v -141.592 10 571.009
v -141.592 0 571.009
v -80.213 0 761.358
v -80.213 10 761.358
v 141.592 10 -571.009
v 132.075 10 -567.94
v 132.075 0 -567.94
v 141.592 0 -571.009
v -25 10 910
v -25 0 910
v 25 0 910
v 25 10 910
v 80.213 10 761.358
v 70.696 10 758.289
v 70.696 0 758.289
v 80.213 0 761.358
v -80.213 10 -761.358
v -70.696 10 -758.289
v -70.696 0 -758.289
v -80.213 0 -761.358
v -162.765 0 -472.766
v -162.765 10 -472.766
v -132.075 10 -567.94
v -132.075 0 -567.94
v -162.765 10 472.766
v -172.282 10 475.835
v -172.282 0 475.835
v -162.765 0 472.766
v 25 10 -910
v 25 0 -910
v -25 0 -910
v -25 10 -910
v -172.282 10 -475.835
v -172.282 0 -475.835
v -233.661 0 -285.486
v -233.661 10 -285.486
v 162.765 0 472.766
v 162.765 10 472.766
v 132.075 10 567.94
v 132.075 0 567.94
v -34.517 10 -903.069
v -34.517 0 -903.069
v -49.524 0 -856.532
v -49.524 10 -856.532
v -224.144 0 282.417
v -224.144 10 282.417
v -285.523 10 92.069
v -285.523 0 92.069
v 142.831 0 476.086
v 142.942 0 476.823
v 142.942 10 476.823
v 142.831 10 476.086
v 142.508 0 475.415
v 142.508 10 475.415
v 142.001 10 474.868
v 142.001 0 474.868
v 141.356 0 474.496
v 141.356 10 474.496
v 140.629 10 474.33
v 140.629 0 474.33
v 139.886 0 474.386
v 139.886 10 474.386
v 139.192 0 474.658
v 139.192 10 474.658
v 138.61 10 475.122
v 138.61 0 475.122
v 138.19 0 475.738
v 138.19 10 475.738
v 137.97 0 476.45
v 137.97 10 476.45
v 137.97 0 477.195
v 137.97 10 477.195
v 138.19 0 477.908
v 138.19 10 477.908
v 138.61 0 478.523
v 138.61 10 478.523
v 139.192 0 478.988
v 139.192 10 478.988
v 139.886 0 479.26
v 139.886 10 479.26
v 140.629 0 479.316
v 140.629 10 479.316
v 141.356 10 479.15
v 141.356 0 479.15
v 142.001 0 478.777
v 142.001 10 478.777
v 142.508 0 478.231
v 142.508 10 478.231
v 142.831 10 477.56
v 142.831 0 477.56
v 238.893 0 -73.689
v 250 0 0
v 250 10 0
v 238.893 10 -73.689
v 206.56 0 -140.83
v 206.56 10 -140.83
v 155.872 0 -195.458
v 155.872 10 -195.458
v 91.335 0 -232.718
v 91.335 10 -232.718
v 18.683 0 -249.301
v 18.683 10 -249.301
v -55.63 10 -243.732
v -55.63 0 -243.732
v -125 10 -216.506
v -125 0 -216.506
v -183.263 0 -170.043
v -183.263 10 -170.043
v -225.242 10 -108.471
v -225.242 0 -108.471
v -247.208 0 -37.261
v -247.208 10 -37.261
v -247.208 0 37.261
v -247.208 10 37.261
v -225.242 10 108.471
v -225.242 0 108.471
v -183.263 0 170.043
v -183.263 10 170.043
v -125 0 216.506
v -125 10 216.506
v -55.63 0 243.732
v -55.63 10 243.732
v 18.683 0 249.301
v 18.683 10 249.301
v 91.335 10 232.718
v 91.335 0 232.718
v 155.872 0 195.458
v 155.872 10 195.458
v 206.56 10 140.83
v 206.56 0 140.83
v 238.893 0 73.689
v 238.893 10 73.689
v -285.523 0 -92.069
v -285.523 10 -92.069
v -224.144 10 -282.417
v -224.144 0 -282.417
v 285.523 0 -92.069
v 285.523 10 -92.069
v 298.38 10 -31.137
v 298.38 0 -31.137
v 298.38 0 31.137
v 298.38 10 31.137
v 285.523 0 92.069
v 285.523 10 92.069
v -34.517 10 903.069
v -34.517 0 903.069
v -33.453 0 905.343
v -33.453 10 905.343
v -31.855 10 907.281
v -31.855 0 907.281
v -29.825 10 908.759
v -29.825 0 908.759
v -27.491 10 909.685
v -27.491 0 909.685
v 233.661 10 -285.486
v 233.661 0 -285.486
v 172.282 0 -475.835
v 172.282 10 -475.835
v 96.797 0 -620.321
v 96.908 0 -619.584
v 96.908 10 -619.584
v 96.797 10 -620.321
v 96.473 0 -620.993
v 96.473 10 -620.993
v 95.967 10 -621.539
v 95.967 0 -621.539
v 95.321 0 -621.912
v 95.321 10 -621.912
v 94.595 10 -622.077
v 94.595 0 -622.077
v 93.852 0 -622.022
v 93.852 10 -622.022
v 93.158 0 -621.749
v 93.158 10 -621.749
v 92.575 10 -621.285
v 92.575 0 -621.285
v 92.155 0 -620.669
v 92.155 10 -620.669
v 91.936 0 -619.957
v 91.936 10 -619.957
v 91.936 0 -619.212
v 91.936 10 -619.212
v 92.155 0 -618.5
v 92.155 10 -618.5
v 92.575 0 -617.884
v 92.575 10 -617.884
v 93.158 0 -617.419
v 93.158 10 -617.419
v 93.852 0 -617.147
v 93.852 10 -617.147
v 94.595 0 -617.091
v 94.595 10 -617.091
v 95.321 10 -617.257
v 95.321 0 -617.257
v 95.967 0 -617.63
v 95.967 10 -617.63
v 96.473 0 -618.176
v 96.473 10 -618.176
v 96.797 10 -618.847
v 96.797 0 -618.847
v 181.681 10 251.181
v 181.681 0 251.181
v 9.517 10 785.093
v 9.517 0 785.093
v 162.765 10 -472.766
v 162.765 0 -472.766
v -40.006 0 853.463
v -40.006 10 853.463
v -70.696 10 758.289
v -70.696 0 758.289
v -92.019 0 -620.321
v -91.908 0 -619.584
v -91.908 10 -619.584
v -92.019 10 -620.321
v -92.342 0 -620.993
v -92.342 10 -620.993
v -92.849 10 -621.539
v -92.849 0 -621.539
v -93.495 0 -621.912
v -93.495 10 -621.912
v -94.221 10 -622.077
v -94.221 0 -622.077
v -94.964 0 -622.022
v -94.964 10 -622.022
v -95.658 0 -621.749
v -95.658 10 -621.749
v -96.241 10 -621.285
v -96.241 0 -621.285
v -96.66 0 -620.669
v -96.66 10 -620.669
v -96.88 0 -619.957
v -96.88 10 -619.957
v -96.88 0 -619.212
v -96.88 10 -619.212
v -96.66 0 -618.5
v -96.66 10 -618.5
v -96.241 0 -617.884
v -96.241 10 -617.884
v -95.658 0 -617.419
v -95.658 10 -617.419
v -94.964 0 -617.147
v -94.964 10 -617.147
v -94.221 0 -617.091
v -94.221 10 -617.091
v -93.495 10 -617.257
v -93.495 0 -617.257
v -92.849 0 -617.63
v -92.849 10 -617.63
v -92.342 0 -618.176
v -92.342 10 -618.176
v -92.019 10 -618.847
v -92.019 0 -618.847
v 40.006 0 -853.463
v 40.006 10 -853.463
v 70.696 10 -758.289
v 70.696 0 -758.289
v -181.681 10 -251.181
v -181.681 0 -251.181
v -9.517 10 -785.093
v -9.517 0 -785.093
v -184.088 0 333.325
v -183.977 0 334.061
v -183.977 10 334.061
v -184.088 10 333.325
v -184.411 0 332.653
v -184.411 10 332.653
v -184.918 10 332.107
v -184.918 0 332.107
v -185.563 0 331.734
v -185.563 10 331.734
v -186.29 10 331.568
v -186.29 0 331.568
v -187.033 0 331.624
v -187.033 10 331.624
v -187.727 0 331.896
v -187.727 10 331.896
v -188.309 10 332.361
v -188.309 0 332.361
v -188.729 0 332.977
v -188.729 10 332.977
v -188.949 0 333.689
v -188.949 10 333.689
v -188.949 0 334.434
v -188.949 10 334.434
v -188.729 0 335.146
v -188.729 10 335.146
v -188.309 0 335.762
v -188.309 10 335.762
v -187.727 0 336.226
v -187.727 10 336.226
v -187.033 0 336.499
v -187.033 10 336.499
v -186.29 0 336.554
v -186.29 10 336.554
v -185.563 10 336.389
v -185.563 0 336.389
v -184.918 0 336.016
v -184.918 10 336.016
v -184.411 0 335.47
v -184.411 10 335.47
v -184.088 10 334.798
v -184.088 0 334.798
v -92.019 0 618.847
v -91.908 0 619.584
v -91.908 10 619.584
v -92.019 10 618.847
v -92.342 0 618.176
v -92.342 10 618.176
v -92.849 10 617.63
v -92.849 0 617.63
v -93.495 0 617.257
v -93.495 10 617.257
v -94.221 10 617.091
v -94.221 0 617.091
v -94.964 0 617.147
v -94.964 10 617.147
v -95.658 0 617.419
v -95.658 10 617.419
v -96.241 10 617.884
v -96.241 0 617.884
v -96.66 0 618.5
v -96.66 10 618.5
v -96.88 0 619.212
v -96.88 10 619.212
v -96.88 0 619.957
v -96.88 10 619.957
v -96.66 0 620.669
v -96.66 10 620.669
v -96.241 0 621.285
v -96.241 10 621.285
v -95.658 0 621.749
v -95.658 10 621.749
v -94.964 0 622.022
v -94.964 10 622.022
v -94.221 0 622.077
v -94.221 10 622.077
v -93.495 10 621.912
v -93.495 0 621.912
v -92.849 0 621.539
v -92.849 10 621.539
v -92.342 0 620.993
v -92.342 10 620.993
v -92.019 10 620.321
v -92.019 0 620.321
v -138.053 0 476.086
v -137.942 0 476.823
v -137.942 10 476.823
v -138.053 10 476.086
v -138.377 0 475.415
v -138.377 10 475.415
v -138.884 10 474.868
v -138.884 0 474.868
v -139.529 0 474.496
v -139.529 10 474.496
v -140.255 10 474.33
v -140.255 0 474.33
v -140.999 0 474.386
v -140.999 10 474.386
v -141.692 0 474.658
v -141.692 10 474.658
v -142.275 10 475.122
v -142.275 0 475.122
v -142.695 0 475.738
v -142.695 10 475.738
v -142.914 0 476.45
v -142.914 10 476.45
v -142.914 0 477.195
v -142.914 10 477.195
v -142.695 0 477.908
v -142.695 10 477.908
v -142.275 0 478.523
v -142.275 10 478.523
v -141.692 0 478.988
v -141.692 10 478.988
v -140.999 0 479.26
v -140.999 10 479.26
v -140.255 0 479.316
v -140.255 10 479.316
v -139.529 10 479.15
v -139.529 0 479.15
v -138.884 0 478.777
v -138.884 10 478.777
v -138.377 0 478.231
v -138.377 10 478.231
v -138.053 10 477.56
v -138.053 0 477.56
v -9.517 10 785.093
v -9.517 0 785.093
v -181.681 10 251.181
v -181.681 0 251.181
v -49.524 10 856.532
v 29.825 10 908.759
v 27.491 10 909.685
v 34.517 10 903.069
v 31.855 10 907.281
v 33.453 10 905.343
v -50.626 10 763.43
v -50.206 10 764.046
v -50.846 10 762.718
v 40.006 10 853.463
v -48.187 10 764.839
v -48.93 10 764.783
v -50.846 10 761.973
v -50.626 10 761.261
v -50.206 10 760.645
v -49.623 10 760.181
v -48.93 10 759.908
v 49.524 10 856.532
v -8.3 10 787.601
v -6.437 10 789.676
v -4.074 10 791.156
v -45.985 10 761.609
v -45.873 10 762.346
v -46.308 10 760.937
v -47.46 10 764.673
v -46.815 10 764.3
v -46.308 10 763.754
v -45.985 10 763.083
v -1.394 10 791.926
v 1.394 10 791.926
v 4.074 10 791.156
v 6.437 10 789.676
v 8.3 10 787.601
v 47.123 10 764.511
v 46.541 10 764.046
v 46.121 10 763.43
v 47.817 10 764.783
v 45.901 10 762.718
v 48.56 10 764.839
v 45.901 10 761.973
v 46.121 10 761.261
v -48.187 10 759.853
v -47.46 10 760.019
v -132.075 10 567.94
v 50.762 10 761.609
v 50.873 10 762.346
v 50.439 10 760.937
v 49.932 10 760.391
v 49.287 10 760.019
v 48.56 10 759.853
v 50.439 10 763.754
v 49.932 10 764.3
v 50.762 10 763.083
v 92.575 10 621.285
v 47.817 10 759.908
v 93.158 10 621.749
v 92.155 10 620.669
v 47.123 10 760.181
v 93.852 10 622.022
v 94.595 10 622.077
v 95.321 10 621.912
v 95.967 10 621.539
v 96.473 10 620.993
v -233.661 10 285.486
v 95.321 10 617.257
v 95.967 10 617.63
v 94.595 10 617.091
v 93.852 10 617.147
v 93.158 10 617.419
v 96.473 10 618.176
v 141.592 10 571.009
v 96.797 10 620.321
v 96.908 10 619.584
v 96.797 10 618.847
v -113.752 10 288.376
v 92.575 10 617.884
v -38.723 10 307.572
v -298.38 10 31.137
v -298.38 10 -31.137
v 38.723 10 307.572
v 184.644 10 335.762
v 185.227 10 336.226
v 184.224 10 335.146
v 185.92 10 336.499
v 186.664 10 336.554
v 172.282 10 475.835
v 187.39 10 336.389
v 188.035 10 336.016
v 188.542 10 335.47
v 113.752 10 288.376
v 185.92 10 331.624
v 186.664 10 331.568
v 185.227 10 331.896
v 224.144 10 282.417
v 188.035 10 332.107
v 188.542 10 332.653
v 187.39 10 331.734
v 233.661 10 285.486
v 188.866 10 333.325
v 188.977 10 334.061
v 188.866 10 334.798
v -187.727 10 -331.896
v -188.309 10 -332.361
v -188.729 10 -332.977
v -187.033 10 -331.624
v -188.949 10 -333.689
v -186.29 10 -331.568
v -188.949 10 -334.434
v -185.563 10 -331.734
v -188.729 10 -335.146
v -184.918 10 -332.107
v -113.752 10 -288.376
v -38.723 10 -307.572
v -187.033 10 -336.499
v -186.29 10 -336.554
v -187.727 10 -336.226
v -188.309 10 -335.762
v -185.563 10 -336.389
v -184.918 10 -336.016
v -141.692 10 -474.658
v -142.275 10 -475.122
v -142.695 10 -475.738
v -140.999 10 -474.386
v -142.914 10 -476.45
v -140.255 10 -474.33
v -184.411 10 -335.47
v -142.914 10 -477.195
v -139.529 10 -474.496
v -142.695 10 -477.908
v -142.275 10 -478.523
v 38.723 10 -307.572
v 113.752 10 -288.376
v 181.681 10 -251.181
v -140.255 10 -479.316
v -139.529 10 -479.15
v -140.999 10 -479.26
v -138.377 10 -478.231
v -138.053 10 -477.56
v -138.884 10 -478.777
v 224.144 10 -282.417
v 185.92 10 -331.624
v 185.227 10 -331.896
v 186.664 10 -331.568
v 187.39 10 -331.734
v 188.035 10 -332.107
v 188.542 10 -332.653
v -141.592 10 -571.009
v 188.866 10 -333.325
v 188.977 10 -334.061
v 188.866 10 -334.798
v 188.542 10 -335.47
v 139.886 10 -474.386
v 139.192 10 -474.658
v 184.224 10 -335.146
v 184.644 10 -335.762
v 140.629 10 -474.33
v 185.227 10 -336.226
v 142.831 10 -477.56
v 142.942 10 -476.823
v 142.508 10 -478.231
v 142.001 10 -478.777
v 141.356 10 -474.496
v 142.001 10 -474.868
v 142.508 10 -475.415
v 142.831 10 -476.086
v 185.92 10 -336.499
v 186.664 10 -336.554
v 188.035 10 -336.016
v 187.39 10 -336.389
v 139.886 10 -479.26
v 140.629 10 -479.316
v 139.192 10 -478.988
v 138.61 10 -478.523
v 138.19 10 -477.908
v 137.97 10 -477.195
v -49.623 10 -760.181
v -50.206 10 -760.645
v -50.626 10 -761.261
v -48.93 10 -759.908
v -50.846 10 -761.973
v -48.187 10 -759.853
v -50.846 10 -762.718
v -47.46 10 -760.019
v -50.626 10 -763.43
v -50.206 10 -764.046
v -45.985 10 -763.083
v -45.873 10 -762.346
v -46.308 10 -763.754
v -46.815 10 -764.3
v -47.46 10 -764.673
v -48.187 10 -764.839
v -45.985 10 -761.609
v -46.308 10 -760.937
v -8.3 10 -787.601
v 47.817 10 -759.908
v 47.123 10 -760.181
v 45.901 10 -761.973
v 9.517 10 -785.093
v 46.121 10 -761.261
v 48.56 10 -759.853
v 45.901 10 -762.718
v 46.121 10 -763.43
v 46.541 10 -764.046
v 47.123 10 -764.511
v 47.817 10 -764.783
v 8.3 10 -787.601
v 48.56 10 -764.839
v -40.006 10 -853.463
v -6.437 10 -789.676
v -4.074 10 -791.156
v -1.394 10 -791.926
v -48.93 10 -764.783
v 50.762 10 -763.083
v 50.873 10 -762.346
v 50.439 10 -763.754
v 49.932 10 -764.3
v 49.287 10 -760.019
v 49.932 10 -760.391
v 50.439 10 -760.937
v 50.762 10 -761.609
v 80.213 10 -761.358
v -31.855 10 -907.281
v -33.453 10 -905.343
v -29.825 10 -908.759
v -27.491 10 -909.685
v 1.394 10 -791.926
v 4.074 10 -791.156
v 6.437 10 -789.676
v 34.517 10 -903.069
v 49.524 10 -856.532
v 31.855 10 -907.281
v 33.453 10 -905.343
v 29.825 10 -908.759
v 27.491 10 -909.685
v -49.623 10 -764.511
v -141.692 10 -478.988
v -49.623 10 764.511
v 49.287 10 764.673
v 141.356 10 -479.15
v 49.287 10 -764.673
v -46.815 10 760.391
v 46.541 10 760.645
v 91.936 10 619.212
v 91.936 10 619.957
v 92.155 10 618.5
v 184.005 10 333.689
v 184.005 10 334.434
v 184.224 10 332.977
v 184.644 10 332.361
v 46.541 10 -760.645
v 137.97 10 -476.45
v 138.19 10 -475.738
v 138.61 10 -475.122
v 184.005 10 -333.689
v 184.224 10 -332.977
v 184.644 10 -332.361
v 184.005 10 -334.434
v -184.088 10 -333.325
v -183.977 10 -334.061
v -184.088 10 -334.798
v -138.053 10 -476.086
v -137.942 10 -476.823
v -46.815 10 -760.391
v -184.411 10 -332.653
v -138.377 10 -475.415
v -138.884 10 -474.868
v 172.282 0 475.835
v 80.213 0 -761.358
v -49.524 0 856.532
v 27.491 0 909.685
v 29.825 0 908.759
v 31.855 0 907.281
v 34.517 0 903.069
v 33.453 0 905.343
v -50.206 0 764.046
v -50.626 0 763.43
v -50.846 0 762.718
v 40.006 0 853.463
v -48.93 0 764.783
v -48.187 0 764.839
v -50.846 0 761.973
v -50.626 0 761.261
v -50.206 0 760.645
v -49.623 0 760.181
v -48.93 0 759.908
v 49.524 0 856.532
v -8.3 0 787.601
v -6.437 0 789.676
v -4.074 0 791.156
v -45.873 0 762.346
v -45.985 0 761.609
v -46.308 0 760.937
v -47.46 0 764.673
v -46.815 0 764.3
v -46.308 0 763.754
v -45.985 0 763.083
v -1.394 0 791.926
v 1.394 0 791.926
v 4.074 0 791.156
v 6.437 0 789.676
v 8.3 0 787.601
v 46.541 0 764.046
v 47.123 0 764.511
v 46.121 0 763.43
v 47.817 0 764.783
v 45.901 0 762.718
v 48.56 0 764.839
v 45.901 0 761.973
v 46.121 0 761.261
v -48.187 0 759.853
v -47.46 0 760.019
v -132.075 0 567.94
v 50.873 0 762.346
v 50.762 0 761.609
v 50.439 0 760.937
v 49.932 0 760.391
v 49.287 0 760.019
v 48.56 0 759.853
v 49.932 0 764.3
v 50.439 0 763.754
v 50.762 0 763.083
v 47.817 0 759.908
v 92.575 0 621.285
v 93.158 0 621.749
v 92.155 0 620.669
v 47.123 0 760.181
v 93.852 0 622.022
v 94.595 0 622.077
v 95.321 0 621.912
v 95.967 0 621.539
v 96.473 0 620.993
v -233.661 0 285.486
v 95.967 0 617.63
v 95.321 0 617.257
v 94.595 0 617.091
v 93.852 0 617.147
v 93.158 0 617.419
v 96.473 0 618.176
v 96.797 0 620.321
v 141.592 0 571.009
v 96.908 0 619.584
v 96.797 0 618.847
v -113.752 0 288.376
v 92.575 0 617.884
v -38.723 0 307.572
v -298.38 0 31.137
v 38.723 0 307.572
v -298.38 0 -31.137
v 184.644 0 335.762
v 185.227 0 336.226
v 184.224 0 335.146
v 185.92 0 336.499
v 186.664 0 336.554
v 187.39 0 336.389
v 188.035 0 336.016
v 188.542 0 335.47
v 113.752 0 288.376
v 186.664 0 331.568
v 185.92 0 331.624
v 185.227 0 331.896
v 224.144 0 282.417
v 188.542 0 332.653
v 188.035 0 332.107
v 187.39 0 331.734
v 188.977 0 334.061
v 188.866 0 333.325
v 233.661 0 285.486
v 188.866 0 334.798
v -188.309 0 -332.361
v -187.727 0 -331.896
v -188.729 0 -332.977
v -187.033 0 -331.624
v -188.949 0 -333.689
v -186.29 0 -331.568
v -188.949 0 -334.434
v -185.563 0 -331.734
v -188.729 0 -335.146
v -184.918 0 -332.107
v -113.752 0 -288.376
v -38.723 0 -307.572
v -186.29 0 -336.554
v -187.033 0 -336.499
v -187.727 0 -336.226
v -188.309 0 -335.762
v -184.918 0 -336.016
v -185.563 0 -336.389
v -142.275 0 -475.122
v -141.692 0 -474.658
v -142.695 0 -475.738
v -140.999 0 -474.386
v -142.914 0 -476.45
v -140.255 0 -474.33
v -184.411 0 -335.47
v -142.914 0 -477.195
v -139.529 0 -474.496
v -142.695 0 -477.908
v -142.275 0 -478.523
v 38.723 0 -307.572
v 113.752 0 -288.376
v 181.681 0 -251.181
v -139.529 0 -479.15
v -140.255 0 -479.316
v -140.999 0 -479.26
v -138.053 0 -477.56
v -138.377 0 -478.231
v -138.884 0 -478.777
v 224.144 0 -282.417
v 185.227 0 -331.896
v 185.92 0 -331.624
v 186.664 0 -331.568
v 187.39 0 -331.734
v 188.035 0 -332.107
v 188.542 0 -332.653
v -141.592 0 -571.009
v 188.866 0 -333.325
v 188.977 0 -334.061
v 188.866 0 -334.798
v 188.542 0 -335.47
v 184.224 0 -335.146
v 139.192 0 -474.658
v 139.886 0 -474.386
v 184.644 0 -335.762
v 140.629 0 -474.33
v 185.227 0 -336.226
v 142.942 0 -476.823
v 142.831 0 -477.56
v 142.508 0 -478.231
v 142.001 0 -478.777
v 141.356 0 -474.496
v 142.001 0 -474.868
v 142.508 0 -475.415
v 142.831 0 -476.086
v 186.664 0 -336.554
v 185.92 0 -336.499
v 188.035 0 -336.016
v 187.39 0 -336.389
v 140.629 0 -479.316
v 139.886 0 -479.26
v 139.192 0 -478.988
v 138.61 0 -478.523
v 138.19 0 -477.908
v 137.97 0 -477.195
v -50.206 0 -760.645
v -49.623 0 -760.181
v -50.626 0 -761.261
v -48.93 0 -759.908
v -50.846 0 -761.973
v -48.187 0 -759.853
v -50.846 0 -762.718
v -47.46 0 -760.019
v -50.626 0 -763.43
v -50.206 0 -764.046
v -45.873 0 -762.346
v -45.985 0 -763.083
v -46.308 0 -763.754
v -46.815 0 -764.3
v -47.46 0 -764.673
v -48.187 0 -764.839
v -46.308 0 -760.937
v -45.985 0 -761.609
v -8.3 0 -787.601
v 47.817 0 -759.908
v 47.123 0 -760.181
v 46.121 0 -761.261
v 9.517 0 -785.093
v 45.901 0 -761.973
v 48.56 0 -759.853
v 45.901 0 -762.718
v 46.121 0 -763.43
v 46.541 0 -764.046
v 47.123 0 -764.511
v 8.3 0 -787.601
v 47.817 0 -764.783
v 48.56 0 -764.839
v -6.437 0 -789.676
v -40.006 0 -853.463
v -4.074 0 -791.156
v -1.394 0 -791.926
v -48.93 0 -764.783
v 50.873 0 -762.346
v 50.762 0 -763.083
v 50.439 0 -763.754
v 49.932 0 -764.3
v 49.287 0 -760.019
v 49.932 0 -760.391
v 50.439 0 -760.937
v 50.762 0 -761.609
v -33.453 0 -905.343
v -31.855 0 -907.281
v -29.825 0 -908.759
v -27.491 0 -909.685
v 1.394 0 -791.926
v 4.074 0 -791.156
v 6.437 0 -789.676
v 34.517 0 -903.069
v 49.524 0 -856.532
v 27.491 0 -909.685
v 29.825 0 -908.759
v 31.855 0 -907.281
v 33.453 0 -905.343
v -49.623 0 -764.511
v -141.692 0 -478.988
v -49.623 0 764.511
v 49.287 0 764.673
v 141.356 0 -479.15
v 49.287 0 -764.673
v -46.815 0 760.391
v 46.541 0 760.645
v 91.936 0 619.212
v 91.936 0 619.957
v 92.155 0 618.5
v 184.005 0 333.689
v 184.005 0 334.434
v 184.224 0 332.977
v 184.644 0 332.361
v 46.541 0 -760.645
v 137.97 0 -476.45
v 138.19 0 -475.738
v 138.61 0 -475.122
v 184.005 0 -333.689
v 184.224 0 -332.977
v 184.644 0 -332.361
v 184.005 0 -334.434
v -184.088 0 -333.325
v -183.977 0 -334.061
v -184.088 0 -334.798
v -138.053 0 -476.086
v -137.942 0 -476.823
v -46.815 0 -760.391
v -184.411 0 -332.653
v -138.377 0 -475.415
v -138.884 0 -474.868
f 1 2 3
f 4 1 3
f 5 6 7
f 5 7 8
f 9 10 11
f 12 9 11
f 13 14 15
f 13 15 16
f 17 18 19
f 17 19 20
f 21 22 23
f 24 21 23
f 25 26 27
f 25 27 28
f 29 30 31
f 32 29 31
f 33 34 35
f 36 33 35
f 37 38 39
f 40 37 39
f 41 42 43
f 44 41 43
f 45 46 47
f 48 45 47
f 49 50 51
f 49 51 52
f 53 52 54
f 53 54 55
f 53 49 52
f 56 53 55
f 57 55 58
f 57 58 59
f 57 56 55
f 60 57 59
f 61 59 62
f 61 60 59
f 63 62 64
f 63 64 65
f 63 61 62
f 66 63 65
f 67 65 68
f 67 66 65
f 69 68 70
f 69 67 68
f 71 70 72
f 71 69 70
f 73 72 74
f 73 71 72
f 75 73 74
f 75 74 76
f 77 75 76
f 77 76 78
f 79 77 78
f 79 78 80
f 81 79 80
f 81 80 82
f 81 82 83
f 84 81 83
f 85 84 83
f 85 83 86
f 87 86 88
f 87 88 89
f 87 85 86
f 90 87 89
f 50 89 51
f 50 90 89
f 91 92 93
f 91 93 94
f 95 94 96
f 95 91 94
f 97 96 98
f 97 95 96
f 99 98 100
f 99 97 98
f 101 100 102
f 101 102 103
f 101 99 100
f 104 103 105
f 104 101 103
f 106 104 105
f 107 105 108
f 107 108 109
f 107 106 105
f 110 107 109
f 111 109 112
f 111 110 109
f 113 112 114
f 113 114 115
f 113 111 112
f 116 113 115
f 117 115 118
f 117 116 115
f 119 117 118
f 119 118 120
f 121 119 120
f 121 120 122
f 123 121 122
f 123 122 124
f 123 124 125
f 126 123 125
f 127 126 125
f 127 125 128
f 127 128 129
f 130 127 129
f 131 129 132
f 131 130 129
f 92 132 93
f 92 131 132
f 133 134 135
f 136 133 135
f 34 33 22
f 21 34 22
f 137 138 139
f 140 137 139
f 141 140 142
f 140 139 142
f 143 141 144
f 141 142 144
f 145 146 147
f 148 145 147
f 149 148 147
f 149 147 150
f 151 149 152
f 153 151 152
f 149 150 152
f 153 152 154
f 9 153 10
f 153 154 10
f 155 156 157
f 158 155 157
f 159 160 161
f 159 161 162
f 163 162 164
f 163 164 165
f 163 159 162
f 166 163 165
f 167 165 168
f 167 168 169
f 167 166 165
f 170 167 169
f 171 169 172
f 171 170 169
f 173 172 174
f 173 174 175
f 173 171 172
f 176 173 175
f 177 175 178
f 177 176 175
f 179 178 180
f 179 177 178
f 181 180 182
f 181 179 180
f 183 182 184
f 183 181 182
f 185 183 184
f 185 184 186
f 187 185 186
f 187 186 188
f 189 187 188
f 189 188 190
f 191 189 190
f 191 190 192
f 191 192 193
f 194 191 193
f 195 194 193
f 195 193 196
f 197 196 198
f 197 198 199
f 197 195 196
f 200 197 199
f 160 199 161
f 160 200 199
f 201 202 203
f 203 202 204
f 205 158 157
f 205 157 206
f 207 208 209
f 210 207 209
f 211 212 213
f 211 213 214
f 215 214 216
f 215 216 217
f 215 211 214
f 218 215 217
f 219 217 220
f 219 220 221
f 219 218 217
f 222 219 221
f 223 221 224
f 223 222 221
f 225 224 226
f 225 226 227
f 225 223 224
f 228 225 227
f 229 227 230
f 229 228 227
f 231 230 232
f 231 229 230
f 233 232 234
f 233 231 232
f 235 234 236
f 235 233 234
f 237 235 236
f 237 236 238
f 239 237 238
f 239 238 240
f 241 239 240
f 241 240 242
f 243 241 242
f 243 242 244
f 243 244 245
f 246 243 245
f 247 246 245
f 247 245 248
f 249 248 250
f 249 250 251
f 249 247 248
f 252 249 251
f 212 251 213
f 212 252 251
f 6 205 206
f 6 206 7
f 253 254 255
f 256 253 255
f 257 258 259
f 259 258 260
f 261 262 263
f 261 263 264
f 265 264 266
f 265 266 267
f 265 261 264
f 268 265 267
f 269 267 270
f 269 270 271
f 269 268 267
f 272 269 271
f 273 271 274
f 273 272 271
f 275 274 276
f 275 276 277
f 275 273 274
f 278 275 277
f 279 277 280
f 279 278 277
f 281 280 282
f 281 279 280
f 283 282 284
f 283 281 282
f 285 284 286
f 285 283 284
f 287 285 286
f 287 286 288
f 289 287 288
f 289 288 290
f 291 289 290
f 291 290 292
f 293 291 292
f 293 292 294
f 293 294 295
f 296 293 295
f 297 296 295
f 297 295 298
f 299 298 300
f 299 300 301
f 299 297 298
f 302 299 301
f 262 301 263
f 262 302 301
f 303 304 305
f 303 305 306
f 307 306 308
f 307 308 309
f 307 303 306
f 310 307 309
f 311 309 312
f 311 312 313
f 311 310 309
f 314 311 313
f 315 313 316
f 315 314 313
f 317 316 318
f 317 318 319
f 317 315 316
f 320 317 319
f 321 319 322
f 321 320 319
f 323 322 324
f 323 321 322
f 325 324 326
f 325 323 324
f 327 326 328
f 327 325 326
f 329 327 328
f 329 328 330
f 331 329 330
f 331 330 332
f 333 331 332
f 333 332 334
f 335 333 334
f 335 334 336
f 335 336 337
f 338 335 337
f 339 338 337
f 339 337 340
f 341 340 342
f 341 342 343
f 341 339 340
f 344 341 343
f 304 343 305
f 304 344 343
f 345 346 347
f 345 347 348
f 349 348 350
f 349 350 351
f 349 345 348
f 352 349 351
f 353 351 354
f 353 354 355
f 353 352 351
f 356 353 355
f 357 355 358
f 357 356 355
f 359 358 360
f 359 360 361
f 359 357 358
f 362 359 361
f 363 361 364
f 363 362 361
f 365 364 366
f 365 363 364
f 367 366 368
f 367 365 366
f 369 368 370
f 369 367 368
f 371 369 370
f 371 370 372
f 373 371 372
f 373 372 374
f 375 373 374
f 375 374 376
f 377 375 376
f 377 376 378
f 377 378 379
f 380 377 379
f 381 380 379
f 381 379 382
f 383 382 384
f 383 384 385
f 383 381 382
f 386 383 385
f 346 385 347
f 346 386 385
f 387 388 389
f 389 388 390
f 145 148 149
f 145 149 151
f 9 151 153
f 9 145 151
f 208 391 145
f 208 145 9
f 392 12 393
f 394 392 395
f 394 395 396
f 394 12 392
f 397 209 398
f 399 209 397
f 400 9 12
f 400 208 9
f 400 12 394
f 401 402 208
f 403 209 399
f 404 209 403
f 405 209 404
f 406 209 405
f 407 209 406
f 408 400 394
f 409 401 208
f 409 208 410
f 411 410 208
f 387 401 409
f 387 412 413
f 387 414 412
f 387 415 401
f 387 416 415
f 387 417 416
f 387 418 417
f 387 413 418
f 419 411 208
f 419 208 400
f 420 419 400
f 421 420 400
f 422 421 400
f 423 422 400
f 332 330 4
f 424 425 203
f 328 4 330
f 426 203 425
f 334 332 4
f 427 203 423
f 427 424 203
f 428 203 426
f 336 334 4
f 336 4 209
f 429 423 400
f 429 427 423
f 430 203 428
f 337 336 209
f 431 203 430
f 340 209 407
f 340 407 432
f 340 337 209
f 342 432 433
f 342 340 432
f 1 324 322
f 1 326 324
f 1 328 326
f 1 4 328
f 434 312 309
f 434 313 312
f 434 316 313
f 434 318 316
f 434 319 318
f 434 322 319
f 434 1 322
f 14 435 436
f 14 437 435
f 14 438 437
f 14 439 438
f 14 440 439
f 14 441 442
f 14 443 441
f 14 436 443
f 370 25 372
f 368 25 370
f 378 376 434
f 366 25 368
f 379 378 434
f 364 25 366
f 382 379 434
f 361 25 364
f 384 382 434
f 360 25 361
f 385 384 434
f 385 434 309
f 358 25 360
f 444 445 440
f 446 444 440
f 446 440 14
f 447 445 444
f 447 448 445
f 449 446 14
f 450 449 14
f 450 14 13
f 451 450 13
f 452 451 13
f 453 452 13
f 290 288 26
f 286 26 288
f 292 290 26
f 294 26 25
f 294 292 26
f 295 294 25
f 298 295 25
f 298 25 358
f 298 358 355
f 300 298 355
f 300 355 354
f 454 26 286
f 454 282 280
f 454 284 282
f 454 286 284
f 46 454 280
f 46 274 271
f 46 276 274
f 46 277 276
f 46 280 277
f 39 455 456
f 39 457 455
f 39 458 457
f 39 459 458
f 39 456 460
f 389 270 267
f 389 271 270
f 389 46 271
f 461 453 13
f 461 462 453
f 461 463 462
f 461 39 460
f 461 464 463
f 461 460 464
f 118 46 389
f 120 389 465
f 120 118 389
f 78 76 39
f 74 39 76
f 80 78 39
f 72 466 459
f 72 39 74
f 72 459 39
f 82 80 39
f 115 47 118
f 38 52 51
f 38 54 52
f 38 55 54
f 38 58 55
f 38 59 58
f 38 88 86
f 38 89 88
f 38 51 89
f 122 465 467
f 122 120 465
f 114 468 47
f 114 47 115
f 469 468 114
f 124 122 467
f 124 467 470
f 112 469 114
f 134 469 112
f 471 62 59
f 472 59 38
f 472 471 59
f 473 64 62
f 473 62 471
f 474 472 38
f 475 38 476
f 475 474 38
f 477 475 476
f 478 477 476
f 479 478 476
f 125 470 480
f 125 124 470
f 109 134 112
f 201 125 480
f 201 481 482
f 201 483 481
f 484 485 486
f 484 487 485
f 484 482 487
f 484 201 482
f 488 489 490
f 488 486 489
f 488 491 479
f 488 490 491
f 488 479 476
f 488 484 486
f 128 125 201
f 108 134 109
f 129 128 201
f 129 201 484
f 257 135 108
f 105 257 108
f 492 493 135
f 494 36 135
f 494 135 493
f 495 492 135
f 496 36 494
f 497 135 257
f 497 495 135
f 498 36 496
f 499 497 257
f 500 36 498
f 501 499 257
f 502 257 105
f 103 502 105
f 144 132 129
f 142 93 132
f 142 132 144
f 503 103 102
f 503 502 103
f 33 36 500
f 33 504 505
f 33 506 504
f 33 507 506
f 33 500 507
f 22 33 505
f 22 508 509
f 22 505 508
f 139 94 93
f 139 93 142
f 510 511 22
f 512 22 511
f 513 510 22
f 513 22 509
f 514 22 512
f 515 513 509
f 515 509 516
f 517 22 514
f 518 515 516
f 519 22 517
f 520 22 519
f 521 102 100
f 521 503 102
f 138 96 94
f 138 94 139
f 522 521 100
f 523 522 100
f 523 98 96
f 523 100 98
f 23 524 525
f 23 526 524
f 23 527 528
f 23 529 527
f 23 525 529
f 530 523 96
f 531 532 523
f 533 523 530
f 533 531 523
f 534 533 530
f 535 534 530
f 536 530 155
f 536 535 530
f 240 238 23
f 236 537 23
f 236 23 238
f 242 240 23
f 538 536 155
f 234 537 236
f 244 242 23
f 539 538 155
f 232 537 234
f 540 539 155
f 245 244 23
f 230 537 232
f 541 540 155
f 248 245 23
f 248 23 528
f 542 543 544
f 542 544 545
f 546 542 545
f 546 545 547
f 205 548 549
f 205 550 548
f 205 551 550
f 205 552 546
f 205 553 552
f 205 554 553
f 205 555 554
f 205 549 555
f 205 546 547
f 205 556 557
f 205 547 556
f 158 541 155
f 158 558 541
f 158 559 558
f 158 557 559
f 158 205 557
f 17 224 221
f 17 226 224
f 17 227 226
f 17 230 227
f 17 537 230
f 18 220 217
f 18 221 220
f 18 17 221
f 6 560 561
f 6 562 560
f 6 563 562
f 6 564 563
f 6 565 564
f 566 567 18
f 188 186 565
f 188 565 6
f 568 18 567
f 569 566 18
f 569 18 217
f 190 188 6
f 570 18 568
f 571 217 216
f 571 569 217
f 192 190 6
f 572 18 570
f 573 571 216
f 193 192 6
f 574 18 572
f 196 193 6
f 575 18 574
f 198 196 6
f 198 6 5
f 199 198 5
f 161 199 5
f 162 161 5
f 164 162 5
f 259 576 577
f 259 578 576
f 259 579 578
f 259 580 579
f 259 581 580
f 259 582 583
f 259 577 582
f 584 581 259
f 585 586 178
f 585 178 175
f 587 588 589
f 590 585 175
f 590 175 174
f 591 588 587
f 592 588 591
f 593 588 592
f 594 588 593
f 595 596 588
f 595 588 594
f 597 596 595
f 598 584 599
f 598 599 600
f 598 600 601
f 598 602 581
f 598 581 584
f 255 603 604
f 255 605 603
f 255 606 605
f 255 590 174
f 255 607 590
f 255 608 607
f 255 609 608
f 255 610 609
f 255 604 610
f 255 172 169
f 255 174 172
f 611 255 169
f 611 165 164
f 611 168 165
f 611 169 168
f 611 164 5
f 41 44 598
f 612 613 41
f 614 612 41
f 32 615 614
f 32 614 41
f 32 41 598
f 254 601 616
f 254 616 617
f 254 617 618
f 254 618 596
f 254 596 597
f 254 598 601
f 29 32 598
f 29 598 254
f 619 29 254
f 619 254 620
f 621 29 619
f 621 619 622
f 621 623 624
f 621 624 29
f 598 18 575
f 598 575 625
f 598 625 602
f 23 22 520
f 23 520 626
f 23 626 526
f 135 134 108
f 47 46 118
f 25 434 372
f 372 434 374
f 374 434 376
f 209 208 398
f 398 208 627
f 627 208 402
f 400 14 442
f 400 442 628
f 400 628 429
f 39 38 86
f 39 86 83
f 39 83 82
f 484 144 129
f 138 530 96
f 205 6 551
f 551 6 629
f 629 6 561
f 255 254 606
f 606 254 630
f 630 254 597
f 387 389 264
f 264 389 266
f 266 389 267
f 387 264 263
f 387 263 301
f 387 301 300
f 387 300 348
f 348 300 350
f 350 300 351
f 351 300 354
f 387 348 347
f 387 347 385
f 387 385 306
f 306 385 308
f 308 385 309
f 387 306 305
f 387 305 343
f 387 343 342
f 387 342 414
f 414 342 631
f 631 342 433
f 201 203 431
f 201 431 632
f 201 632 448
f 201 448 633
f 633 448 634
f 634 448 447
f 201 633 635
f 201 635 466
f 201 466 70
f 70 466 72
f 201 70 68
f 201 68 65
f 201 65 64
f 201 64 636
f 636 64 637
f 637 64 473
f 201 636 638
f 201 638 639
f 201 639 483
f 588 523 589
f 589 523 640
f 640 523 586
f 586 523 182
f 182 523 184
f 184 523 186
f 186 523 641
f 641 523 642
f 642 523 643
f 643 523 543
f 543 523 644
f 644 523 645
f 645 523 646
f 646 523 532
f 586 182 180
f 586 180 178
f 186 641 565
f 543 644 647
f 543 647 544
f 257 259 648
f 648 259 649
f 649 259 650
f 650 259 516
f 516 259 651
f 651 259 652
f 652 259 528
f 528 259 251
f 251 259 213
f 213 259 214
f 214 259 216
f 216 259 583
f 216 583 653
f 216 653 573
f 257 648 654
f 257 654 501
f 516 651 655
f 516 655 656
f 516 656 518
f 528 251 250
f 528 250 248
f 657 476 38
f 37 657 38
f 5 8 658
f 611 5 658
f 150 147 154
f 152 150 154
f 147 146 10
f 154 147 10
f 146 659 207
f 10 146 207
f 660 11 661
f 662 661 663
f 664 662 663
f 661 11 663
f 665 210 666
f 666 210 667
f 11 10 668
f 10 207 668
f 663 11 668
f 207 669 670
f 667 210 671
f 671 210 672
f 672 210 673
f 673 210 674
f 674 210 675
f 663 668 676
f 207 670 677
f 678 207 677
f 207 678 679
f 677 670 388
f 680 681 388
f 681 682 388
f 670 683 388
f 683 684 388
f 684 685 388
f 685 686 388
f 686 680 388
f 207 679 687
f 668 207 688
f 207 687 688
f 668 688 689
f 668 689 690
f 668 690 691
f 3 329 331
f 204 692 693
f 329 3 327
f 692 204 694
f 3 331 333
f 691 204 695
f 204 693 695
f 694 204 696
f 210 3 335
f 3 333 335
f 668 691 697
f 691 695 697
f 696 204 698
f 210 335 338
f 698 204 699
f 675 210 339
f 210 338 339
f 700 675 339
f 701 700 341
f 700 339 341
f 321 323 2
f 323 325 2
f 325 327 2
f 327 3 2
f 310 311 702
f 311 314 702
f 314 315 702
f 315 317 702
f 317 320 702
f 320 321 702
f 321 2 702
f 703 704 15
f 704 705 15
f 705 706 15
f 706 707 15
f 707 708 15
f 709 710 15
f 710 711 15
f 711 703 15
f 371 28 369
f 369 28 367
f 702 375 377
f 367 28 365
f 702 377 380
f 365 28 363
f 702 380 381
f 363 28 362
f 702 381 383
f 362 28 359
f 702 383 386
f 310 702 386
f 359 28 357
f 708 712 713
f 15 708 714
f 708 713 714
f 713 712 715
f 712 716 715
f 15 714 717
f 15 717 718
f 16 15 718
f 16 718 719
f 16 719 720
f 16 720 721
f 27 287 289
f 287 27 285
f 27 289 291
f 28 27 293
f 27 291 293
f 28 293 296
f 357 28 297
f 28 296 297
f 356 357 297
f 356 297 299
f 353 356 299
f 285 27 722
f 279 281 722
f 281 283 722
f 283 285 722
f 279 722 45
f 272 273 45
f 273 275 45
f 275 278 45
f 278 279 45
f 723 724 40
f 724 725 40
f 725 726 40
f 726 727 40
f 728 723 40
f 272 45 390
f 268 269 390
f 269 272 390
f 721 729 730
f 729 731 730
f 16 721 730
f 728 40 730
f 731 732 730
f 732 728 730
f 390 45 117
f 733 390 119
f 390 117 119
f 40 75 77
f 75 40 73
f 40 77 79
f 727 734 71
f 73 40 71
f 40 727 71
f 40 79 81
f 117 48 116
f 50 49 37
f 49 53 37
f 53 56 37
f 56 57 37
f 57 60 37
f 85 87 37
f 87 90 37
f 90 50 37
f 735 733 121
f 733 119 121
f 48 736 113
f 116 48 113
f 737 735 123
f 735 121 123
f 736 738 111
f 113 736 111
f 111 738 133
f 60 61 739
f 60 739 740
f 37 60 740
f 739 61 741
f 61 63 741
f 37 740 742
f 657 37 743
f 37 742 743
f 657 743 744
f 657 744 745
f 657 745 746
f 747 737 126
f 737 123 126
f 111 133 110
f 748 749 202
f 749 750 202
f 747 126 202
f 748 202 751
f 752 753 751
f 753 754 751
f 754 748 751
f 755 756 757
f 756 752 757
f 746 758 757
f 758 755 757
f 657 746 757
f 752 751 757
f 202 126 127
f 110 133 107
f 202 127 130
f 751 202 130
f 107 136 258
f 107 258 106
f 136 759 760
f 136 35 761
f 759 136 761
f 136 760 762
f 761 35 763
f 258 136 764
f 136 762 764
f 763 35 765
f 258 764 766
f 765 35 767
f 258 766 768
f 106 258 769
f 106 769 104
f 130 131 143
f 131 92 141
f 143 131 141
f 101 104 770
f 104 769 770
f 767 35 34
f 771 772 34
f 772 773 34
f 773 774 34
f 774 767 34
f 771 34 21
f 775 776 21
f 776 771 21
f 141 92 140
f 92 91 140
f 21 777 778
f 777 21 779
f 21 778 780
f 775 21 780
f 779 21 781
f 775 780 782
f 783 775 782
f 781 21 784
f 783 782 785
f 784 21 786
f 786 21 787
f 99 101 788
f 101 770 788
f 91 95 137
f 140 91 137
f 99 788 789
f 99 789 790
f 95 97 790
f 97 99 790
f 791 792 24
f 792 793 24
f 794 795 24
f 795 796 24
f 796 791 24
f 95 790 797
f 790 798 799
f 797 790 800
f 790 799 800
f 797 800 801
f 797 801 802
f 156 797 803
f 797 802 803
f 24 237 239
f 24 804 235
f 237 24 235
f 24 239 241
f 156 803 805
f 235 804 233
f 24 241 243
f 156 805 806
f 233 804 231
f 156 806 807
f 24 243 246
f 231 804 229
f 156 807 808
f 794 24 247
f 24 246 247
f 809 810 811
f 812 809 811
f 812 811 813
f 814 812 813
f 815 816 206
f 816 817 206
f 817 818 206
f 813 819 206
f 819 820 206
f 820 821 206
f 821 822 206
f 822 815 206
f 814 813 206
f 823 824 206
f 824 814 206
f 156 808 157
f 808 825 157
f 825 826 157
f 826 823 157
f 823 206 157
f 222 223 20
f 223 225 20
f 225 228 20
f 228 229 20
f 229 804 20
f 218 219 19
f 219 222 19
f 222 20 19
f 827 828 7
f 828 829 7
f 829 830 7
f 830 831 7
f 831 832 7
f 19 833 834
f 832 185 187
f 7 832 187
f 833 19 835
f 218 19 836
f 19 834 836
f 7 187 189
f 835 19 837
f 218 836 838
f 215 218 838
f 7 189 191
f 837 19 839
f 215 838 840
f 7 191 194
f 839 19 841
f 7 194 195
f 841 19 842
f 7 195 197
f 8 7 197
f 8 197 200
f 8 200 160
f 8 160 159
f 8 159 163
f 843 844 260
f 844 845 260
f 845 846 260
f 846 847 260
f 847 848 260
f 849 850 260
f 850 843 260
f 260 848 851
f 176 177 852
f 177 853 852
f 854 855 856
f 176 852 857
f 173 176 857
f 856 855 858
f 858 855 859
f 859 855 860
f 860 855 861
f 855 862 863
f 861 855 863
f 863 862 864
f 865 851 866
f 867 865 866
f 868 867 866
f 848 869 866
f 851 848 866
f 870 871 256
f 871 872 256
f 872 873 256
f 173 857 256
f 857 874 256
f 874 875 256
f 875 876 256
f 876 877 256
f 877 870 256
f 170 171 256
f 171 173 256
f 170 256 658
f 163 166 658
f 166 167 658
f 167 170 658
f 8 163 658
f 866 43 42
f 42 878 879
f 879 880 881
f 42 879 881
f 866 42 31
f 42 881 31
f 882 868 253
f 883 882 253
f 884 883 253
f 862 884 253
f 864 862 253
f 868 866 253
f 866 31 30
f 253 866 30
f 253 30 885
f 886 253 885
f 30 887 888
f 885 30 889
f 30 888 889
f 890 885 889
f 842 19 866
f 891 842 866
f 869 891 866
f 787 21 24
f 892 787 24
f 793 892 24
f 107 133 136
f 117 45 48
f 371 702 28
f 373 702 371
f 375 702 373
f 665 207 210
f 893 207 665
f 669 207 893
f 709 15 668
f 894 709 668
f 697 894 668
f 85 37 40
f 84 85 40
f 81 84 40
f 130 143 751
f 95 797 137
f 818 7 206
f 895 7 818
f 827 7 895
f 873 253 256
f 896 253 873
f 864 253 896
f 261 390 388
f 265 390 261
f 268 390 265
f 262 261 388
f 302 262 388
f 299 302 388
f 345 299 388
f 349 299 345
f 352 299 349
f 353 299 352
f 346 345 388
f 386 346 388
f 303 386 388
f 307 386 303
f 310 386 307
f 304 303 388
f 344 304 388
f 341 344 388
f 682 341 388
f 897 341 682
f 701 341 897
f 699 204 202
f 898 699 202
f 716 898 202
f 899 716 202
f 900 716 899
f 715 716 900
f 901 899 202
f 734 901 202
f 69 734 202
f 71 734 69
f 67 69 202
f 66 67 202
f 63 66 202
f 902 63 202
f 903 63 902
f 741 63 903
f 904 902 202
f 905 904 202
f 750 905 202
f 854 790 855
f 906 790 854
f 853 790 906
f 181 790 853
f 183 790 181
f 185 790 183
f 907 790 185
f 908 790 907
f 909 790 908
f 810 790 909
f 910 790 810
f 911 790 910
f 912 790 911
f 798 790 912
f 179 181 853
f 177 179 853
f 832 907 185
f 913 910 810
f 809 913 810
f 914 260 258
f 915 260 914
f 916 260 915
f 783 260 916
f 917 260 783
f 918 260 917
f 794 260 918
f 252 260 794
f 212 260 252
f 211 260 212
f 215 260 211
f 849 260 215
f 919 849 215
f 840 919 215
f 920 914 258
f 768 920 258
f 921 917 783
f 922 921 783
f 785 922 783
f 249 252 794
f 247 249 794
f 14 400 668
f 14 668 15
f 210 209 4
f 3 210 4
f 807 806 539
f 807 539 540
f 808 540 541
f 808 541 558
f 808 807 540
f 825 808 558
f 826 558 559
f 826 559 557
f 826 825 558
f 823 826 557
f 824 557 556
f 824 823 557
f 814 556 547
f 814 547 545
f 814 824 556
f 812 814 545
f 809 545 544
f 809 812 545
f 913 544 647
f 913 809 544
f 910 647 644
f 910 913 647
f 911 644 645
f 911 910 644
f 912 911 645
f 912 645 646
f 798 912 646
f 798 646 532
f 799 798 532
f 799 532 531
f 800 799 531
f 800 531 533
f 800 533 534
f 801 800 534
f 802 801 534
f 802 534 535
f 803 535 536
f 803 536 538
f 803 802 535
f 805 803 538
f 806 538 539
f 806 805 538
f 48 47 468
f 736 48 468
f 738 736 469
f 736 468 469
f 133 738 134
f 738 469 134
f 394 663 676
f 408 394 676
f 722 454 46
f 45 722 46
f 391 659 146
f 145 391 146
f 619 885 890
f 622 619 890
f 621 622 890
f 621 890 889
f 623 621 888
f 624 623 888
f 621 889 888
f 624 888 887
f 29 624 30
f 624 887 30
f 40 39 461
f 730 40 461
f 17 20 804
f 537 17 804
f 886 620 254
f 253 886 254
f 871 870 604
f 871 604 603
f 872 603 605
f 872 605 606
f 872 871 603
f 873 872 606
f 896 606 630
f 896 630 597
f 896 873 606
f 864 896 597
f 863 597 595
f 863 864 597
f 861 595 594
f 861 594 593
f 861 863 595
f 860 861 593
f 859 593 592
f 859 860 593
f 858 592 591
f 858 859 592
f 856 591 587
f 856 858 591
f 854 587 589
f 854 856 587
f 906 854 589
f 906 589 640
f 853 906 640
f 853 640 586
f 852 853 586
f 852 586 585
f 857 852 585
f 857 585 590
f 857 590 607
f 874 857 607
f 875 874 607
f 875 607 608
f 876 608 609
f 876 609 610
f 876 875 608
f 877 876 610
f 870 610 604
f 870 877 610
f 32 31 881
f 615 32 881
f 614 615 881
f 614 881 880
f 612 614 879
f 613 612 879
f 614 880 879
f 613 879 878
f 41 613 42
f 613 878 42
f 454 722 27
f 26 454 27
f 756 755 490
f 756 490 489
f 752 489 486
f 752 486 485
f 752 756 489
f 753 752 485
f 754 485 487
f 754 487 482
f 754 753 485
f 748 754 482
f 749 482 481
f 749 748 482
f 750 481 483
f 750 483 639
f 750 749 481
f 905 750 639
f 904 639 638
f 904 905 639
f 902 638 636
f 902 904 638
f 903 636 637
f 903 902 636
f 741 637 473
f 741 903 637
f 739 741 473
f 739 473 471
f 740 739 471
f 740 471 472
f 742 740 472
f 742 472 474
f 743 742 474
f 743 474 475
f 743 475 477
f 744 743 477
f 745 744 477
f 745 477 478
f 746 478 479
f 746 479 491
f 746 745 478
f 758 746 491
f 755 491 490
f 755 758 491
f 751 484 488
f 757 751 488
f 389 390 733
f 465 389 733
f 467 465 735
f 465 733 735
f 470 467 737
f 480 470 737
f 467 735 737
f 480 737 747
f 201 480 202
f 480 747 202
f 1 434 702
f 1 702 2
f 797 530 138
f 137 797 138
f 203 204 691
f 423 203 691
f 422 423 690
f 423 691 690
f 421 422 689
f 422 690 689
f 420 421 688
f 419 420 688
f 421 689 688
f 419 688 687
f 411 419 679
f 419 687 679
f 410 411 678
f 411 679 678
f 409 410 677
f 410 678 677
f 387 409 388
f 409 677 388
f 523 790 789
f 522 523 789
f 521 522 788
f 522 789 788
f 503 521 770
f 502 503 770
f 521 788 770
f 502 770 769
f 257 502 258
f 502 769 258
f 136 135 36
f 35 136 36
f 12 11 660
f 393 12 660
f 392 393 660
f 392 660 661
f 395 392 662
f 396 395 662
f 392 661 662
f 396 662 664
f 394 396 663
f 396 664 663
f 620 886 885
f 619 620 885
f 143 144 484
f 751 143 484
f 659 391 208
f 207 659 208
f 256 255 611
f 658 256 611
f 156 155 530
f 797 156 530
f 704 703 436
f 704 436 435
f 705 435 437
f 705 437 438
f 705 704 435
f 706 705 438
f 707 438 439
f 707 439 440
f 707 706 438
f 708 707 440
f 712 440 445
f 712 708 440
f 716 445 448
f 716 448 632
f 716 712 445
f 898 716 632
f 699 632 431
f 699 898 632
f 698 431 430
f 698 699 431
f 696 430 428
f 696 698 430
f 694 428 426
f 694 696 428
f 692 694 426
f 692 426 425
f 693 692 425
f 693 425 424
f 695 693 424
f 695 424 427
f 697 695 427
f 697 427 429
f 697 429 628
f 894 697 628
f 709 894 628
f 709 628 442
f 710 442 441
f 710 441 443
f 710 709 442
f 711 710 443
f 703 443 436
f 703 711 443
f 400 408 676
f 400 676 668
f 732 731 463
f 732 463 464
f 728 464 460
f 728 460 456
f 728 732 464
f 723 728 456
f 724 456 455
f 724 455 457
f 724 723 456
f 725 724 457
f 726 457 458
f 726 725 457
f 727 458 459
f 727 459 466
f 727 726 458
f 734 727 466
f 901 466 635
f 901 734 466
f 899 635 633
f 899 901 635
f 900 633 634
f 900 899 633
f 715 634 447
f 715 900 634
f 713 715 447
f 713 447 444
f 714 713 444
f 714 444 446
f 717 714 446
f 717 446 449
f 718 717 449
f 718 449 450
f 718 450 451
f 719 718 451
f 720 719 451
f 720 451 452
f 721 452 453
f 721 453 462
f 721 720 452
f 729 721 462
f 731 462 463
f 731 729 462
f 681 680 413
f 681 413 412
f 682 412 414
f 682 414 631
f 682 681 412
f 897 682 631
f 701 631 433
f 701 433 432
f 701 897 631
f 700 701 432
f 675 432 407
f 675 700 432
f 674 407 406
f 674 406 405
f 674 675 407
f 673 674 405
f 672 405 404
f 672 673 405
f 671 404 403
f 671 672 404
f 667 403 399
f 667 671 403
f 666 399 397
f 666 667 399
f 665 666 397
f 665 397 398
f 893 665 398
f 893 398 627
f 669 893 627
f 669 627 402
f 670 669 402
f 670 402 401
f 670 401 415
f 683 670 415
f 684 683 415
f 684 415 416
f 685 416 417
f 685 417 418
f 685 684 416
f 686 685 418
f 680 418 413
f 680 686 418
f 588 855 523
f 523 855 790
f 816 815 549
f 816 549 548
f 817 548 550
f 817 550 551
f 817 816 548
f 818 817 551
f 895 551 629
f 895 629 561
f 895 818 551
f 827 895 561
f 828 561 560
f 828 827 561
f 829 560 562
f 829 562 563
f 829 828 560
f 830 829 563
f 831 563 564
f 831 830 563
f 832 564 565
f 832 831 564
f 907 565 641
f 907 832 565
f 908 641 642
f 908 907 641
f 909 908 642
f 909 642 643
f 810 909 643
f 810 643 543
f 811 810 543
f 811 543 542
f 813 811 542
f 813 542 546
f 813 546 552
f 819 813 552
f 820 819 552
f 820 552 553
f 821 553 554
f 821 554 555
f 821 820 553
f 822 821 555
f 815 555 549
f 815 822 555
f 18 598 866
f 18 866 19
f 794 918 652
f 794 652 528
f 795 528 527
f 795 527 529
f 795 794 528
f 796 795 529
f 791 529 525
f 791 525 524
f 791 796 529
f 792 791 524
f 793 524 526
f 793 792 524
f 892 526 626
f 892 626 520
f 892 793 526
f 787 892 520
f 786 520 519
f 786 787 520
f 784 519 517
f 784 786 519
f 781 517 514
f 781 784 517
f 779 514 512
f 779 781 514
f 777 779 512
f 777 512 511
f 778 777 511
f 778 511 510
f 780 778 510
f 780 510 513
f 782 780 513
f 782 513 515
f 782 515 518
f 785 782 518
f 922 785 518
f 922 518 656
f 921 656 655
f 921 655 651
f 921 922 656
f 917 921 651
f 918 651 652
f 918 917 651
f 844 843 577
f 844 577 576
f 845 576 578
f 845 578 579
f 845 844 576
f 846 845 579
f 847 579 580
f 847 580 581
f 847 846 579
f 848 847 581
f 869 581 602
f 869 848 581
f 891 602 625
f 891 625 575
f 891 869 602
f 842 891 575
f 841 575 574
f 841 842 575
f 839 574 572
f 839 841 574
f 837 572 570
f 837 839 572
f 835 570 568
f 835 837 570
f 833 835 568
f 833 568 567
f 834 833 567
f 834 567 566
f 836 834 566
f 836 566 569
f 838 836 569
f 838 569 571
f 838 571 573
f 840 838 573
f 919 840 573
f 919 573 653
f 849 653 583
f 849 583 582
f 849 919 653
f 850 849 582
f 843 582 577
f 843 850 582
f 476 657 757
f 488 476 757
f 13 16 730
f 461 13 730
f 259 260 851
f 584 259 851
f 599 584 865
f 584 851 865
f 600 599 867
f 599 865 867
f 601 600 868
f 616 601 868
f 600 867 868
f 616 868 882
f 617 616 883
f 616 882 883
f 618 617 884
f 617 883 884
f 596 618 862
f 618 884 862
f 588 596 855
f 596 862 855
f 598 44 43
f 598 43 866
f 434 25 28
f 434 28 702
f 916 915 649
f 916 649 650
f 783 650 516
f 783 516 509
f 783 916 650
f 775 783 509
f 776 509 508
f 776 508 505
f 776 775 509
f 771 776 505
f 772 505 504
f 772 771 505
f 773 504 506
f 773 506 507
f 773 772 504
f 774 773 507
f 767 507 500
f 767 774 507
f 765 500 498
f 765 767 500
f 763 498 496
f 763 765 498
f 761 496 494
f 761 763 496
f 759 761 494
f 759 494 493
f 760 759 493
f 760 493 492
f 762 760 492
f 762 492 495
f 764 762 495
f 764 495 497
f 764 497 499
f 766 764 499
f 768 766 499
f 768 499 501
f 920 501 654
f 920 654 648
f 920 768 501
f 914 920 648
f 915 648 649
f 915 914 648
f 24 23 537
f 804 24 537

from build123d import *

# Parameters (mm, degrees)
SKETCH2_R           = 2.5
SKETCH2_R_2         = 250
BOSS_EXTRUDE1_DEPTH = 10
CUT_EXTRUDE1_DEPTH  = 11


with BuildPart() as part:
    # Sketch2 → Boss-Extrude1 (new body)
    with BuildSketch(Plane(origin=(0, 0, 0), x_dir=(1, 0, 0), z_dir=(0, 1, 0))):
        with BuildLine():
            Line((-34.517430478, 903.068960265), (-295.040344804, 95.1377682))
            ThreePointArc((-295.040344804, 95.1377682), (-310, 0), (-295.040344804, -95.1377682))
            Line((-295.040344804, -95.1377682), (-34.517430478, -903.068960265))
            ThreePointArc((-34.517430478, -903.068960265), (-30.886866626, -908.083613135), (-25, -910))
            Line((-25, -910), (25, -910))
            ThreePointArc((25, -910), (30.886866626, -908.083613135), (34.517430478, -903.068960265))
            Line((34.517430478, -903.068960265), (295.040344804, -95.1377682))
            ThreePointArc((295.040344804, -95.1377682), (310, 0), (295.040344804, 95.1377682))
            Line((295.040344804, 95.1377682), (34.517430478, 903.068960265))
            ThreePointArc((34.517430478, 903.068960265), (30.886866626, 908.083613135), (25, 910))
            Line((25, 910), (-25, 910))
            ThreePointArc((-25, 910), (-30.886866626, 908.083613135), (-34.517430478, 903.068960265))
        make_face()
        with Locations((-48.373467006, -762.345774842)):
            Circle(SKETCH2_R, mode=Mode.SUBTRACT)
        with Locations((-94.407870974, -619.584317679)):
            Circle(SKETCH2_R, mode=Mode.SUBTRACT)
        with Locations((-140.442274942, -476.822860516)):
            Circle(SKETCH2_R, mode=Mode.SUBTRACT)
        with BuildLine():
            ThreePointArc((-181.680791071, -251.181388952), (0, -310), (181.680791071, -251.181388952))
            Line((181.680791071, -251.181388952), (9.517430478, -785.092770658))
            ThreePointArc((9.517430478, -785.092770658), (0, -792.023810393), (-9.517430478, -785.092770658))
            Line((-9.517430478, -785.092770658), (-181.680791071, -251.181388952))
        make_face(mode=Mode.SUBTRACT)
        with Locations((-186.476678909, -334.061403353)):
            Circle(SKETCH2_R, mode=Mode.SUBTRACT)
        with Locations((48.373467006, -762.345774842)):
            Circle(SKETCH2_R, mode=Mode.SUBTRACT)
        with Locations((94.407870974, -619.584317679)):
            Circle(SKETCH2_R, mode=Mode.SUBTRACT)
        with Locations((140.442274942, -476.822860516)):
            Circle(SKETCH2_R, mode=Mode.SUBTRACT)
        with Locations((186.476678909, -334.061403353)):
            Circle(SKETCH2_R, mode=Mode.SUBTRACT)
        with Locations((-186.476678909, 334.061403353)):
            Circle(SKETCH2_R, mode=Mode.SUBTRACT)
        with Locations((-140.442274942, 476.822860516)):
            Circle(SKETCH2_R, mode=Mode.SUBTRACT)
        with Locations((-94.407870974, 619.584317679)):
            Circle(SKETCH2_R, mode=Mode.SUBTRACT)
        with BuildLine():
            ThreePointArc((181.680791071, 251.181388952), (0, 310), (-181.680791071, 251.181388952))
            Line((-181.680791071, 251.181388952), (-9.517430478, 785.092770658))
            ThreePointArc((-9.517430478, 785.092770658), (0, 792.023810393), (9.517430478, 785.092770658))
            Line((9.517430478, 785.092770658), (181.680791071, 251.181388952))
        make_face(mode=Mode.SUBTRACT)
        with Locations((-48.373467006, 762.345774842)):
            Circle(SKETCH2_R, mode=Mode.SUBTRACT)
        Circle(SKETCH2_R_2, mode=Mode.SUBTRACT)
        with Locations((186.476678909, 334.061403353)):
            Circle(SKETCH2_R, mode=Mode.SUBTRACT)
        with Locations((140.442274942, 476.822860516)):
            Circle(SKETCH2_R, mode=Mode.SUBTRACT)
        with Locations((94.407870974, 619.584317679)):
            Circle(SKETCH2_R, mode=Mode.SUBTRACT)
        with Locations((48.373467006, 762.345774842)):
            Circle(SKETCH2_R, mode=Mode.SUBTRACT)
    extrude(amount=BOSS_EXTRUDE1_DEPTH)

    # Sketch3 → Cut-Extrude1 (cut, through all)
    with BuildSketch(Plane(origin=(0, 10, 0), x_dir=(1, 0, 0), z_dir=(0, 1, 0))):
        Polygon((-49.523523643, -856.532206403), (-40.006093165, -853.463246139), (-70.69569581, -758.288941363), (-80.213126288, -761.357901628), align=None)
        Polygon((-132.074901101, -567.940331812), (-141.592331578, -571.009292077), (-172.281934223, -475.834987302), (-162.764503746, -472.766027037), align=None)
        with BuildLine():
            Line((-233.661139514, -285.486377751), (-224.143709036, -282.417417486))
            Line((-224.143709036, -282.417417486), (-285.522914326, -92.068807935))
            ThreePointArc((-285.522914326, -92.068807935), (-300, 0), (-285.522914326, 92.068807935))
            Line((-285.522914326, 92.068807935), (-224.143709036, 282.417417486))
            Line((-224.143709036, 282.417417486), (-233.661139514, 285.486377751))
            Line((-233.661139514, 285.486377751), (-295.040344804, 95.1377682))
            ThreePointArc((-295.040344804, 95.1377682), (-310, 0), (-295.040344804, -95.1377682))
            Line((-295.040344804, -95.1377682), (-233.661139514, -285.486377751))
        make_face()
        Polygon((-49.523523643, 856.532206403), (-40.006093165, 853.463246139), (-70.69569581, 758.288941363), (-80.213126288, 761.357901628), align=None)
        Polygon((-162.764503746, 472.766027037), (-132.074901101, 567.940331812), (-141.592331578, 571.009292077), (-172.281934223, 475.834987302), align=None)
        Polygon((49.523523643, 856.532206403), (40.006093165, 853.463246139), (70.69569581, 758.288941363), (80.213126288, 761.357901628), align=None)
        Polygon((49.523523643, -856.532206403), (40.006093165, -853.463246139), (70.69569581, -758.288941363), (80.213126288, -761.357901628), align=None)
        Polygon((132.074901101, 567.940331812), (141.592331578, 571.009292077), (172.281934223, 475.834987302), (162.764503746, 472.766027037), align=None)
        with BuildLine():
            Line((233.661139514, 285.486377751), (224.143709036, 282.417417486))
            Line((224.143709036, 282.417417486), (285.522914326, 92.068807935))
            ThreePointArc((285.522914326, 92.068807935), (300, 0), (285.522914326, -92.068807935))
            Line((285.522914326, -92.068807935), (224.143709036, -282.417417486))
            Line((224.143709036, -282.417417486), (233.661139514, -285.486377751))
            Line((233.661139514, -285.486377751), (295.040344804, -95.1377682))
            ThreePointArc((295.040344804, -95.1377682), (310, 0), (295.040344804, 95.1377682))
            Line((295.040344804, 95.1377682), (233.661139514, 285.486377751))
        make_face()
        Polygon((162.764503746, -472.766027037), (132.074901101, -567.940331812), (141.592331578, -571.009292077), (172.281934223, -475.834987302), align=None)
    extrude(amount=-CUT_EXTRUDE1_DEPTH, mode=Mode.SUBTRACT)


solid = part.part
